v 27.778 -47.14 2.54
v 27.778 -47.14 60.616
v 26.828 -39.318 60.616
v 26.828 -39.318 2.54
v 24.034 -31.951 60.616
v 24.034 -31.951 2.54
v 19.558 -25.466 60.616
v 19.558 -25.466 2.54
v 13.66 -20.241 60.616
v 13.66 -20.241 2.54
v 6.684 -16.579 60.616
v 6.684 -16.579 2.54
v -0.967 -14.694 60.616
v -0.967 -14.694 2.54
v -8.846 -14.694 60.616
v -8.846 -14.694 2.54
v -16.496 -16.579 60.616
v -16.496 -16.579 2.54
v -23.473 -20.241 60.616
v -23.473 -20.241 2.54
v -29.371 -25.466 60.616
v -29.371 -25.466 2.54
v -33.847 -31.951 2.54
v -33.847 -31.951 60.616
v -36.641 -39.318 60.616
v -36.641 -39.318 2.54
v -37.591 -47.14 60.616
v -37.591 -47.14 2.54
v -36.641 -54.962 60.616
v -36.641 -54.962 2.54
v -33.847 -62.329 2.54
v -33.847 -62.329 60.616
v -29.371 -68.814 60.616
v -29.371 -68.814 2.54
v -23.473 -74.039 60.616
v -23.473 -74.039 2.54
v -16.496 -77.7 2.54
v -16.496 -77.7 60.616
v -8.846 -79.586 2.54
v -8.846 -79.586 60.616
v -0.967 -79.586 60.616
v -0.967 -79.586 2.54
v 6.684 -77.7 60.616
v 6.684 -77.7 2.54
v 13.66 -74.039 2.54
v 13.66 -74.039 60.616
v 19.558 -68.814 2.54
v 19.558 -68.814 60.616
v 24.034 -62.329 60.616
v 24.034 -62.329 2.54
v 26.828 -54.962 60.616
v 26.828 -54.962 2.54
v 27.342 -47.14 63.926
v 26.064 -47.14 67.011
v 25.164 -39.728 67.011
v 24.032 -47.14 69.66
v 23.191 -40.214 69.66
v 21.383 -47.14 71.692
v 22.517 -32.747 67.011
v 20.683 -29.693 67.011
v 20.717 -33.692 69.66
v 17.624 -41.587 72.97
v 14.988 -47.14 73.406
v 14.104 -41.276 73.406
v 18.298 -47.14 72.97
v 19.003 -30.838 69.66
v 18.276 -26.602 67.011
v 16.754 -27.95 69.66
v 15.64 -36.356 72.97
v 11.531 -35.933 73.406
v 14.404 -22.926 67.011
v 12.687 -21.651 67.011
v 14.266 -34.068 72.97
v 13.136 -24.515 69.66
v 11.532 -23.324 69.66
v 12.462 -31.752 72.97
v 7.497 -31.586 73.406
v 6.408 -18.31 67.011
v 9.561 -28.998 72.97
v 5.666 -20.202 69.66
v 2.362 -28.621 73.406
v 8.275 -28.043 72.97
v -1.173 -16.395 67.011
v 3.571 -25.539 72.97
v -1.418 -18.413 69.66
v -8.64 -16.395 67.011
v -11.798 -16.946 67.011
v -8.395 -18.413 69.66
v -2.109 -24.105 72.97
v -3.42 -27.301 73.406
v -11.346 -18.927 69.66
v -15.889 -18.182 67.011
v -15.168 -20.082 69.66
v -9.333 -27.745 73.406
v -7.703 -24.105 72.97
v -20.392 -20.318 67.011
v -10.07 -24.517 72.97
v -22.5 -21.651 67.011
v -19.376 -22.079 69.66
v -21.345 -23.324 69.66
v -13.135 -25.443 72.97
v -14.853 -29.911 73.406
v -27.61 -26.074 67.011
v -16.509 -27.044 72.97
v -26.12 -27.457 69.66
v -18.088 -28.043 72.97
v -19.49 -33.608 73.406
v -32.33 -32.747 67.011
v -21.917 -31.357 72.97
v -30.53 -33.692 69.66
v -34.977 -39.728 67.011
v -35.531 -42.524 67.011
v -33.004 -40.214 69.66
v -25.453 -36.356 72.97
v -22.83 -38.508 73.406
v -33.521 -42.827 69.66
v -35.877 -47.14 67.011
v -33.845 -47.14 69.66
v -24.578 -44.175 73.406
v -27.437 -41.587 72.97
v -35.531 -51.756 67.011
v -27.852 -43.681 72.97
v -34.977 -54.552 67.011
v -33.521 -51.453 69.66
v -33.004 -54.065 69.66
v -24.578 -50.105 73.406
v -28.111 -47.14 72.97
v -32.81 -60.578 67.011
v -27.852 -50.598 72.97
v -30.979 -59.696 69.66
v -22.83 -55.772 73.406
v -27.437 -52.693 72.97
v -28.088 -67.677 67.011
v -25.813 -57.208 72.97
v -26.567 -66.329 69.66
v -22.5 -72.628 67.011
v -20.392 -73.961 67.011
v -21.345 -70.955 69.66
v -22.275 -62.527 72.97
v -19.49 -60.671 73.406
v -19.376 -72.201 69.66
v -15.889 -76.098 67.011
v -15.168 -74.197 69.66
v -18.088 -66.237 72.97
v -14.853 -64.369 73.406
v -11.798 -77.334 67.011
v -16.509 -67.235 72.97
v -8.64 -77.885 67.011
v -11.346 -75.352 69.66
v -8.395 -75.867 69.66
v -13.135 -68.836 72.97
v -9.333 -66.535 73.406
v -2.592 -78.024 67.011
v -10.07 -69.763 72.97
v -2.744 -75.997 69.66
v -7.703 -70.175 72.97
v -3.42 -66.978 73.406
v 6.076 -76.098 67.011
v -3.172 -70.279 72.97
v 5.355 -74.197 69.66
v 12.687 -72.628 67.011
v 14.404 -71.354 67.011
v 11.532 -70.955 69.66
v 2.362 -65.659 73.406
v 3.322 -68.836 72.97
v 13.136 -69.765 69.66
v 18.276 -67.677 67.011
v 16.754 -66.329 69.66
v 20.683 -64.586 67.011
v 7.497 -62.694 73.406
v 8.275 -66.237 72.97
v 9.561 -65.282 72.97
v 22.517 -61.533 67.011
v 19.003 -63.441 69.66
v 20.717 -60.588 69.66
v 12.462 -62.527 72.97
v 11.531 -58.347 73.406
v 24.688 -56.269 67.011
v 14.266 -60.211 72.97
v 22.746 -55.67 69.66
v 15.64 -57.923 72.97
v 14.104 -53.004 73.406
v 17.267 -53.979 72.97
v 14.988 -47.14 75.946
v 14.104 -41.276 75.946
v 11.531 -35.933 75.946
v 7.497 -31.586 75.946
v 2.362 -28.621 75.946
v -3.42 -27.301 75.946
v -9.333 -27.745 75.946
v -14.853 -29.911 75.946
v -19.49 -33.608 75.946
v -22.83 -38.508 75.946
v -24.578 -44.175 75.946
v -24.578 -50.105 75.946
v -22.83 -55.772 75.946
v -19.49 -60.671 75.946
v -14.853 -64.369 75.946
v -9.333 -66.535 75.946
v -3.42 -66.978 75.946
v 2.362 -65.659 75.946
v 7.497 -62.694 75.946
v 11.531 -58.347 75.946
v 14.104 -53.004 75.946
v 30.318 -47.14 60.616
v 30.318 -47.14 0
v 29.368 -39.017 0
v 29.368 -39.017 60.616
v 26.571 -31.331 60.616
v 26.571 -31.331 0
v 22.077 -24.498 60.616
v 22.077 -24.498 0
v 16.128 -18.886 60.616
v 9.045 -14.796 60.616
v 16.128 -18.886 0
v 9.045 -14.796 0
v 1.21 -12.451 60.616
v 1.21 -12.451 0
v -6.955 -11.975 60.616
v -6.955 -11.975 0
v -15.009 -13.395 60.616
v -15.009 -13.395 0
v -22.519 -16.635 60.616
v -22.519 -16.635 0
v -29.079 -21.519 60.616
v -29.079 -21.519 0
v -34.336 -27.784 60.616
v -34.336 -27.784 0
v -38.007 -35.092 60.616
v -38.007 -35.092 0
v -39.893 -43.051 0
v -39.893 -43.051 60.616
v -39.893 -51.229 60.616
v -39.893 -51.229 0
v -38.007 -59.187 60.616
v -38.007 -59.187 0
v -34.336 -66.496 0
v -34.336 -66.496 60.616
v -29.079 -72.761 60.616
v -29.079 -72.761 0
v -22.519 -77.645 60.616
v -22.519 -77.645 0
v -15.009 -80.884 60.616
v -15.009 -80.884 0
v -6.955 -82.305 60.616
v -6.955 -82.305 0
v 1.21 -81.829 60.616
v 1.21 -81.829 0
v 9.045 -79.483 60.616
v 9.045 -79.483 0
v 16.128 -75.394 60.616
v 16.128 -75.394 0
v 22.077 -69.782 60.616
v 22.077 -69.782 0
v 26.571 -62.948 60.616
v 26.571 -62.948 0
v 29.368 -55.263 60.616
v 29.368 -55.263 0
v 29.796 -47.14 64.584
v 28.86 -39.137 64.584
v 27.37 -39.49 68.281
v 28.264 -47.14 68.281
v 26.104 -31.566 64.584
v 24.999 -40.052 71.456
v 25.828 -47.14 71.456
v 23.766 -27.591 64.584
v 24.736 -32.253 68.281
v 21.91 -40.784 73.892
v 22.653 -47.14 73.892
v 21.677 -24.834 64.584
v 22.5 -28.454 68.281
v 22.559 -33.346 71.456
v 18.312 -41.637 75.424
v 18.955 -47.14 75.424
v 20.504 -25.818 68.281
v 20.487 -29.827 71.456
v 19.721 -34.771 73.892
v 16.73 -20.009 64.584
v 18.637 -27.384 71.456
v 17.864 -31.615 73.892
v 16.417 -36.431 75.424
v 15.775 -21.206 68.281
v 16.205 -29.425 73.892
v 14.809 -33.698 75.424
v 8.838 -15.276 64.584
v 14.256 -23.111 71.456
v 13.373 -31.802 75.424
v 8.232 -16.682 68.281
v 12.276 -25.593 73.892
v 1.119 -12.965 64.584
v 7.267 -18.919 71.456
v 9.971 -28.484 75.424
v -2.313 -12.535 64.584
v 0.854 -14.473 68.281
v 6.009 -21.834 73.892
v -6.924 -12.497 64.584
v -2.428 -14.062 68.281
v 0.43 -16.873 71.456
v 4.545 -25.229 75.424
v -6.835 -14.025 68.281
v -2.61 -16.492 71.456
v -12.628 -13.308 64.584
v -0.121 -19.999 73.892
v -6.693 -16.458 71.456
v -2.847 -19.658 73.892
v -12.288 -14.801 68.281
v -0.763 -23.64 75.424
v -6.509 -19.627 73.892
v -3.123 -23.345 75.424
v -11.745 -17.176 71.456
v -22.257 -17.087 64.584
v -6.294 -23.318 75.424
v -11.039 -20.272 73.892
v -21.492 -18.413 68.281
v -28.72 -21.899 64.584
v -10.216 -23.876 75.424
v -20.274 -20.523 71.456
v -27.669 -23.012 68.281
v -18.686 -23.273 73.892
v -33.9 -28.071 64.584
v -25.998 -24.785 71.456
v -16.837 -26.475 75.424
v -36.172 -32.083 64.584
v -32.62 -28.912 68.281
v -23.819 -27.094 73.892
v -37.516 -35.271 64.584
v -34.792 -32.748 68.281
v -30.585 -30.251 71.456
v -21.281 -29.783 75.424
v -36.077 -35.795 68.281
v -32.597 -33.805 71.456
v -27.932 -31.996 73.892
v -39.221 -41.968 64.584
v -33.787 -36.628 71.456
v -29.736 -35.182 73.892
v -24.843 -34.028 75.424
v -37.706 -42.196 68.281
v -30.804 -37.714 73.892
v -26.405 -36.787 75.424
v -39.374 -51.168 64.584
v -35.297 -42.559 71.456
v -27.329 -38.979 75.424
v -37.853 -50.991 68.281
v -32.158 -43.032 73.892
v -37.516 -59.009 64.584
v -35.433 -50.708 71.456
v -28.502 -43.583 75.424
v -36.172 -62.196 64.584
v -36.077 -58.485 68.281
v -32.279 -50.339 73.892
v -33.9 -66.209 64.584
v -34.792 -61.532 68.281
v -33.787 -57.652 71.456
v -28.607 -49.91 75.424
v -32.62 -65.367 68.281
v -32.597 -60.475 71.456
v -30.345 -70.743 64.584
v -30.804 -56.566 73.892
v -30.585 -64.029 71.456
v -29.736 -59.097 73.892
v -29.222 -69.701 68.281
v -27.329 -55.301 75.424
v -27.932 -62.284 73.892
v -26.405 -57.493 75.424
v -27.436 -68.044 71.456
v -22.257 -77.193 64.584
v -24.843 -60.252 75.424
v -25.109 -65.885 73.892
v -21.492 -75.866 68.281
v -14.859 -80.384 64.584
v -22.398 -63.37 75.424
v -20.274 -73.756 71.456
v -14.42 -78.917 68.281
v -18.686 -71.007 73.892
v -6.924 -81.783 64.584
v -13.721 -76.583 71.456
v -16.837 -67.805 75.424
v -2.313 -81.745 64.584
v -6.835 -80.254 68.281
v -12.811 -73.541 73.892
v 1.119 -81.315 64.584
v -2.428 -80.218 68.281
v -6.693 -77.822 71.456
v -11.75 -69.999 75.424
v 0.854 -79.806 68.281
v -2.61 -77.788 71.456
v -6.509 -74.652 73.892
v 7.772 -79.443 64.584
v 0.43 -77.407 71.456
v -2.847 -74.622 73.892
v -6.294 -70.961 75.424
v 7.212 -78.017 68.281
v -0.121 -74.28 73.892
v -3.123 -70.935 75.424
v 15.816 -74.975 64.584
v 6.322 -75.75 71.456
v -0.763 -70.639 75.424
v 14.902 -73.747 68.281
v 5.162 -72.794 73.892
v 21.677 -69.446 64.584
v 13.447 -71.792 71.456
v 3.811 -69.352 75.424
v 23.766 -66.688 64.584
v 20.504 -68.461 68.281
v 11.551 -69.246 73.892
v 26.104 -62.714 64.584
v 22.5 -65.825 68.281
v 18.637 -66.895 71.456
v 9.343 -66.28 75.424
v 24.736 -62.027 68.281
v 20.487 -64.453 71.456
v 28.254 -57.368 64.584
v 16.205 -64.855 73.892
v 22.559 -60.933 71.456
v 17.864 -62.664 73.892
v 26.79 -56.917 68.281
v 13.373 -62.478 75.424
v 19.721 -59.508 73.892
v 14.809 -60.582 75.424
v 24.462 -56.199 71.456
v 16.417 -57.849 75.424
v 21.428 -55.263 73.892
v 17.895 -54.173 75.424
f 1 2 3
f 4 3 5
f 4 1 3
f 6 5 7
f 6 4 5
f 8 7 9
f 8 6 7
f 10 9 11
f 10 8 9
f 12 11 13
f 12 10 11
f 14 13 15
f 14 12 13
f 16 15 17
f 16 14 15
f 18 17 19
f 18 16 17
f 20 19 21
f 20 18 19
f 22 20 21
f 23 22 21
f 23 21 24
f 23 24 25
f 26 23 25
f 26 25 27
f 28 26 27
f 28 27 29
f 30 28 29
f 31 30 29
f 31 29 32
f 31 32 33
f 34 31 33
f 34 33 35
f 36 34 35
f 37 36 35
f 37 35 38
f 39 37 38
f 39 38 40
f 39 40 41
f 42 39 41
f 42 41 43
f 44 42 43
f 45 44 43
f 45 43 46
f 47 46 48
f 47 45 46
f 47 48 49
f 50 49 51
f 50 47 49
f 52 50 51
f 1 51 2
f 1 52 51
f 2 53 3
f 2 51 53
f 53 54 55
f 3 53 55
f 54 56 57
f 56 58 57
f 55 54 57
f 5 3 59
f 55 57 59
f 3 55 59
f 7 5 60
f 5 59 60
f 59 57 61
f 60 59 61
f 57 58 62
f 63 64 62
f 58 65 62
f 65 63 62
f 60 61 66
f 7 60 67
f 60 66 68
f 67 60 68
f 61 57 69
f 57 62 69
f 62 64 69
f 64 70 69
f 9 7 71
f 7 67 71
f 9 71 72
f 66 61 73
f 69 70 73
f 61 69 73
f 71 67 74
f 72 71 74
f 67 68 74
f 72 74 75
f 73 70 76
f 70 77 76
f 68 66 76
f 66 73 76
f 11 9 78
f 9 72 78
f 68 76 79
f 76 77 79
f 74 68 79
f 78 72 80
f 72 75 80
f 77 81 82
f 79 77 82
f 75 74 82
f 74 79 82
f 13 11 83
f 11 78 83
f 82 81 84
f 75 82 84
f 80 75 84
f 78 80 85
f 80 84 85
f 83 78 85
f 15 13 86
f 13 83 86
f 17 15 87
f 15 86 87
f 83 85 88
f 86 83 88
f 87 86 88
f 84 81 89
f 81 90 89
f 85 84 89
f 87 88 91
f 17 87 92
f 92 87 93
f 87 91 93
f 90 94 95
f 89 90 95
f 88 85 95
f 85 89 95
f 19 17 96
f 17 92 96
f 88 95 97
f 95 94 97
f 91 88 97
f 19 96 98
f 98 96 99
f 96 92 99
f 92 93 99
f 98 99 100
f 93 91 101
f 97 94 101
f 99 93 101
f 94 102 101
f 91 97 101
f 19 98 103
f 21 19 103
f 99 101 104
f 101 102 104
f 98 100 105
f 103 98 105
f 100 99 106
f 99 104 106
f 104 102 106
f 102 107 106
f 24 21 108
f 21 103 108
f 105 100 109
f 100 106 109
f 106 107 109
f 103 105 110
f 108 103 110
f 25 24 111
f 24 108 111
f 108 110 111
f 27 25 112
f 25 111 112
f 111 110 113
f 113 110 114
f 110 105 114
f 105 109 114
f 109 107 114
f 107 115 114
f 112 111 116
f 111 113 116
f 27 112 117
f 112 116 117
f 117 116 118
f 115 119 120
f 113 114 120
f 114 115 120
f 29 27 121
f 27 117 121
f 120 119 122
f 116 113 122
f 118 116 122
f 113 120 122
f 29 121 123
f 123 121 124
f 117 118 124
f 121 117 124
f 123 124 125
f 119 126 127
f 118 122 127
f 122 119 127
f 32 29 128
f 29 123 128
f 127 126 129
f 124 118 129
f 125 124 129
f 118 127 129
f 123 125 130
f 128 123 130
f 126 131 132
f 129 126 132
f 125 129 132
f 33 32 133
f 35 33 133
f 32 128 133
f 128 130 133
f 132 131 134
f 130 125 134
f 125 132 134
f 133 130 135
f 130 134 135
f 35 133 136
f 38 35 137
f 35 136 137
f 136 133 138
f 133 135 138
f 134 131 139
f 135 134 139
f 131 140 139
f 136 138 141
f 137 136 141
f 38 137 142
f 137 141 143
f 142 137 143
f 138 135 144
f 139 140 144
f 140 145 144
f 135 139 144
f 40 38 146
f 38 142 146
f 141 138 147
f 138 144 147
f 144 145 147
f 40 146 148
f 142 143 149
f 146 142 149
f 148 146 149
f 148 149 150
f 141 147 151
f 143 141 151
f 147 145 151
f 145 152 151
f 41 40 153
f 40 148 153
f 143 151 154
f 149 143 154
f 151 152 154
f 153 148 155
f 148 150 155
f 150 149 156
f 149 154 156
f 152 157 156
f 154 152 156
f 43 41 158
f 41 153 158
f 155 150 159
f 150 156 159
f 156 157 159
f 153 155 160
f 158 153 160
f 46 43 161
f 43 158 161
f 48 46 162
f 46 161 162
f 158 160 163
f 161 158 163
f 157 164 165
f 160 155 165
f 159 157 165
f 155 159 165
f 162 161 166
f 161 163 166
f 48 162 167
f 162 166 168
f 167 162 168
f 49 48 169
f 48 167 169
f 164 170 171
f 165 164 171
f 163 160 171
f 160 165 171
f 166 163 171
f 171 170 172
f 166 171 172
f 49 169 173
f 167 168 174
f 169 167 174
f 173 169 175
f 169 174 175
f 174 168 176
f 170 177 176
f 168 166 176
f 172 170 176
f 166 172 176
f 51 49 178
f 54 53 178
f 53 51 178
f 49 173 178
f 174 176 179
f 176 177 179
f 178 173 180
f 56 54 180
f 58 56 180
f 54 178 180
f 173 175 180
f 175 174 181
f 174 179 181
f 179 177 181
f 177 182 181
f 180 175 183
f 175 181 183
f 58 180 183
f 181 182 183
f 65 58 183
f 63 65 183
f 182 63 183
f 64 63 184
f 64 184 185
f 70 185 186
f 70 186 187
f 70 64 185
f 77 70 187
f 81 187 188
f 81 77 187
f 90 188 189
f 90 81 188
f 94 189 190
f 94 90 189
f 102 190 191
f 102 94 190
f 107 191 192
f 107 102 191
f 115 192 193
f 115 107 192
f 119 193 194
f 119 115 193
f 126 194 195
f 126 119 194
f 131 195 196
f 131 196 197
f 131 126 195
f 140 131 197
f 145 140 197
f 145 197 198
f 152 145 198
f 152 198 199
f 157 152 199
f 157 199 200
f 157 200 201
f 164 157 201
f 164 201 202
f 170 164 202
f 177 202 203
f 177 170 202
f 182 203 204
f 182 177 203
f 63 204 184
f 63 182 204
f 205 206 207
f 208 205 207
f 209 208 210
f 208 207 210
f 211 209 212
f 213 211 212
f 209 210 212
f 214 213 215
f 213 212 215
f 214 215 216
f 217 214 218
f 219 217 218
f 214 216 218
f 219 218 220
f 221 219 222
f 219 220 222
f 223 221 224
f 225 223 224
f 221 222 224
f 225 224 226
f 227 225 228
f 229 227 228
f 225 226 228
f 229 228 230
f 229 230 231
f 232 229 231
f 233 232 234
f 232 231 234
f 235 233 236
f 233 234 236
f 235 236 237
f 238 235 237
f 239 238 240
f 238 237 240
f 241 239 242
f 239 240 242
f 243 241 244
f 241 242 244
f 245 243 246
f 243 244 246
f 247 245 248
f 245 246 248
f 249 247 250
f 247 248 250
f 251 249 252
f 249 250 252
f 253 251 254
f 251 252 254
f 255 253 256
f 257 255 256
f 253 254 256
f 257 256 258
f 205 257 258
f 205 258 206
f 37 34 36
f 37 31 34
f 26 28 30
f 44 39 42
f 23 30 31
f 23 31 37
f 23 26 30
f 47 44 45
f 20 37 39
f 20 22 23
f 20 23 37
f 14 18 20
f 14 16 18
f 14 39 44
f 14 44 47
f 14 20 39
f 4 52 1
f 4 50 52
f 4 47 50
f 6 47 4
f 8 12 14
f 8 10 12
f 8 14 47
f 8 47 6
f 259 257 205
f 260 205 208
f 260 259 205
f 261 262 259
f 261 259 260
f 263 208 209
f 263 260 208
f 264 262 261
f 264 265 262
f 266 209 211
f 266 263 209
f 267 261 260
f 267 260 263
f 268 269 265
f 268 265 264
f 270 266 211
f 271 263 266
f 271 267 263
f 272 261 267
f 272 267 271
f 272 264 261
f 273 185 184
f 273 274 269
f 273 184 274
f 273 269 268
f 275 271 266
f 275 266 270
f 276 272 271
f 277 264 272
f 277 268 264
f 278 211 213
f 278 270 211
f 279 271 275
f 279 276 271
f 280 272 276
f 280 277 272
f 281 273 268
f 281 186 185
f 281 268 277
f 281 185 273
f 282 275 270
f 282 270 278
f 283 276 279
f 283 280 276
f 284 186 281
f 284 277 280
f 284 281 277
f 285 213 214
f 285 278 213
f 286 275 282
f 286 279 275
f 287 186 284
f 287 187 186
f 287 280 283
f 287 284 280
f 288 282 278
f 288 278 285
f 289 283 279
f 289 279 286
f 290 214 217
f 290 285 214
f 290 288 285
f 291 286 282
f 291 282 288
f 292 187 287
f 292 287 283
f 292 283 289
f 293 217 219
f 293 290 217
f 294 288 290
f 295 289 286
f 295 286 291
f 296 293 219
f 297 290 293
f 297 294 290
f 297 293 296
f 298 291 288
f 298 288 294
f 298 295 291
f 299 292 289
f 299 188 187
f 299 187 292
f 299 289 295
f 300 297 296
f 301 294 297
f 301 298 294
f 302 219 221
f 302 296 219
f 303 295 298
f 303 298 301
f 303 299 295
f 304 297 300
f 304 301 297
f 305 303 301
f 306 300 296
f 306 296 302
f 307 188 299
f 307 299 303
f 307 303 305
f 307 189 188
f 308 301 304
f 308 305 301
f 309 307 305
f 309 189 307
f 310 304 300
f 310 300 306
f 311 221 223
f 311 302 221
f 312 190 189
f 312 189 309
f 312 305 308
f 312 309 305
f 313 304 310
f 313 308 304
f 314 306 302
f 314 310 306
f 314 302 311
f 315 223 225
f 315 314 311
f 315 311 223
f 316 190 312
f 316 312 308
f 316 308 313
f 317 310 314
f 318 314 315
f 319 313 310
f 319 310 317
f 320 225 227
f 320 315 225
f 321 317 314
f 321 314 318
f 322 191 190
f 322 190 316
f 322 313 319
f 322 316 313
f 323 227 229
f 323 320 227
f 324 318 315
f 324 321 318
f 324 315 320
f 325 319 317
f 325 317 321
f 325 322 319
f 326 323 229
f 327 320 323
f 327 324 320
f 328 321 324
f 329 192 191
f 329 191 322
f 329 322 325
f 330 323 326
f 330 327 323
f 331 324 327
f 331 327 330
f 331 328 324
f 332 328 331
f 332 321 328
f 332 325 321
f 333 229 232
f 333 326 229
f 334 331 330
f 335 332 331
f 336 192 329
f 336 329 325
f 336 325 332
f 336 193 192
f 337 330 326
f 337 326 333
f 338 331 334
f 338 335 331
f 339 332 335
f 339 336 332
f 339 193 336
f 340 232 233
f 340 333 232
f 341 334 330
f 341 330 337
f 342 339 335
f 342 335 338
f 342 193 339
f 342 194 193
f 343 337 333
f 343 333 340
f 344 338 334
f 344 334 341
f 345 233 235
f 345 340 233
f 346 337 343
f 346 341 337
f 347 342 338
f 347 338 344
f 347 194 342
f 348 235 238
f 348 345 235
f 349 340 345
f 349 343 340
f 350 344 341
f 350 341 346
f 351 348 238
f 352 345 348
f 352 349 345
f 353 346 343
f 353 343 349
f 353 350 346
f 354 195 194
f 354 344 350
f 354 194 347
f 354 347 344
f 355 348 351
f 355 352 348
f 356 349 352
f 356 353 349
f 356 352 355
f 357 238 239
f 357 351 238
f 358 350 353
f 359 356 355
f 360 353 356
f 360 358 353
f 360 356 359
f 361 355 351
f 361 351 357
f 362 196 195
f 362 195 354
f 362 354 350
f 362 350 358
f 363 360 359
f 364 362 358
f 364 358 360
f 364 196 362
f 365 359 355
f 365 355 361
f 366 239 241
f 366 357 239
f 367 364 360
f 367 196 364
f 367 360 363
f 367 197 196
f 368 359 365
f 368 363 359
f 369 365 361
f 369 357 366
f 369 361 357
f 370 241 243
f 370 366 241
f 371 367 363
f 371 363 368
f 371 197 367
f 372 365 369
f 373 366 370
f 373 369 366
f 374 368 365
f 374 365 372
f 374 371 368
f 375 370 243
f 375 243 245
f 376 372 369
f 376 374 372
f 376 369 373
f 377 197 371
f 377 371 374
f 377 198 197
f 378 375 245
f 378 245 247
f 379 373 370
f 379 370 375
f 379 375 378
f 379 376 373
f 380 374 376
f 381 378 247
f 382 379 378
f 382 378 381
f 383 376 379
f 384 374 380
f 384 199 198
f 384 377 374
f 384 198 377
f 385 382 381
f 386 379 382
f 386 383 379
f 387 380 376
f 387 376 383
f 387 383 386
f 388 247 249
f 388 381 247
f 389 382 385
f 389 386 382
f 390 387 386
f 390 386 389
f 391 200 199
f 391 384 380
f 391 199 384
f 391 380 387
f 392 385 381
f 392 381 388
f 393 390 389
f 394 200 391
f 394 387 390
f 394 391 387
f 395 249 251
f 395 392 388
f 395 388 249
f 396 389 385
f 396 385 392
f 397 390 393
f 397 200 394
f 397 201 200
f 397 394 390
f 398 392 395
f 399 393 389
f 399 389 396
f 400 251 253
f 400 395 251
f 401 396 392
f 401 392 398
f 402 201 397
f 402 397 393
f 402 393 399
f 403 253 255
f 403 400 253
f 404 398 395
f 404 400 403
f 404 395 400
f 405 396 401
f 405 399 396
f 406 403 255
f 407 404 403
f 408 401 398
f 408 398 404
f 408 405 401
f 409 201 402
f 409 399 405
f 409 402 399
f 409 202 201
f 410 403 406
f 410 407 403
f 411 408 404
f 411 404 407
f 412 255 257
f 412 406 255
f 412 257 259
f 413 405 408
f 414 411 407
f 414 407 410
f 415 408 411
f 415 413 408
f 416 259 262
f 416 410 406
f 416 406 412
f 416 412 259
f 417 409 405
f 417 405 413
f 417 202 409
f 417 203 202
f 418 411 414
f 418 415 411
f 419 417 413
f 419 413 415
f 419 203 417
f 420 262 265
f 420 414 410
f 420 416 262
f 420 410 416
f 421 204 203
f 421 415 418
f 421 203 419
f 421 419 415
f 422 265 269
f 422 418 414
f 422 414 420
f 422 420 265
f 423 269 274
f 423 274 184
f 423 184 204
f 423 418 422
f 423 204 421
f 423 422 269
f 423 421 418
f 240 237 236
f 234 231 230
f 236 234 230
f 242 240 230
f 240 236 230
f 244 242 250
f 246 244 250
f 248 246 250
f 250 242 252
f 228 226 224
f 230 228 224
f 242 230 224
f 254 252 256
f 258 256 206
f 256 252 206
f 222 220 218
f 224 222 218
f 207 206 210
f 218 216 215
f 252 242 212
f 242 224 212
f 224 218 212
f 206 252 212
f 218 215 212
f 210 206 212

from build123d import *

# Parameters (mm, degrees)
F0_R     = 35.2243618103
F1_DEPTH = 75.946
F2_R     = 15.3302561211
F3_T     = -2.54


# Not quite as in the source:
# - a shell that OpenCascade refuses in one call is made with other operations: the cavity is built on its own and cut out


with BuildPart() as f1:
    # F0 (on Top) → F1 (new body)
    with BuildSketch(Plane.XY):
        with Locations((-4.9064448103, -47.139827162)):
            Circle(F0_R)
    extrude(amount=F1_DEPTH)

    # F2
    f2_edges = [f1.edges().sort_by_distance(p)[0] for p in [
        (-40.130807, -47.139827, 75.946),
    ]]
    fillet(f2_edges, radius=F2_R)

    # F3: a shell. OpenCascade refuses it in one call, so the cavity is built on its own and cut out:
    # the body offset inwards by the wall thickness, plus a prism from it out through each open face.
    f3_core = offset(f1.part, amount=F3_T, mode=Mode.PRIVATE)
    f3_exits = [f3_core.faces().sort_by_distance(p)[0] for p in [
        (-4.906445, -47.139827, 73.406),
    ]]
    add(f3_core, mode=Mode.SUBTRACT)
    extrude(f3_exits, amount=-F3_T, mode=Mode.SUBTRACT)


solid = f1.part
